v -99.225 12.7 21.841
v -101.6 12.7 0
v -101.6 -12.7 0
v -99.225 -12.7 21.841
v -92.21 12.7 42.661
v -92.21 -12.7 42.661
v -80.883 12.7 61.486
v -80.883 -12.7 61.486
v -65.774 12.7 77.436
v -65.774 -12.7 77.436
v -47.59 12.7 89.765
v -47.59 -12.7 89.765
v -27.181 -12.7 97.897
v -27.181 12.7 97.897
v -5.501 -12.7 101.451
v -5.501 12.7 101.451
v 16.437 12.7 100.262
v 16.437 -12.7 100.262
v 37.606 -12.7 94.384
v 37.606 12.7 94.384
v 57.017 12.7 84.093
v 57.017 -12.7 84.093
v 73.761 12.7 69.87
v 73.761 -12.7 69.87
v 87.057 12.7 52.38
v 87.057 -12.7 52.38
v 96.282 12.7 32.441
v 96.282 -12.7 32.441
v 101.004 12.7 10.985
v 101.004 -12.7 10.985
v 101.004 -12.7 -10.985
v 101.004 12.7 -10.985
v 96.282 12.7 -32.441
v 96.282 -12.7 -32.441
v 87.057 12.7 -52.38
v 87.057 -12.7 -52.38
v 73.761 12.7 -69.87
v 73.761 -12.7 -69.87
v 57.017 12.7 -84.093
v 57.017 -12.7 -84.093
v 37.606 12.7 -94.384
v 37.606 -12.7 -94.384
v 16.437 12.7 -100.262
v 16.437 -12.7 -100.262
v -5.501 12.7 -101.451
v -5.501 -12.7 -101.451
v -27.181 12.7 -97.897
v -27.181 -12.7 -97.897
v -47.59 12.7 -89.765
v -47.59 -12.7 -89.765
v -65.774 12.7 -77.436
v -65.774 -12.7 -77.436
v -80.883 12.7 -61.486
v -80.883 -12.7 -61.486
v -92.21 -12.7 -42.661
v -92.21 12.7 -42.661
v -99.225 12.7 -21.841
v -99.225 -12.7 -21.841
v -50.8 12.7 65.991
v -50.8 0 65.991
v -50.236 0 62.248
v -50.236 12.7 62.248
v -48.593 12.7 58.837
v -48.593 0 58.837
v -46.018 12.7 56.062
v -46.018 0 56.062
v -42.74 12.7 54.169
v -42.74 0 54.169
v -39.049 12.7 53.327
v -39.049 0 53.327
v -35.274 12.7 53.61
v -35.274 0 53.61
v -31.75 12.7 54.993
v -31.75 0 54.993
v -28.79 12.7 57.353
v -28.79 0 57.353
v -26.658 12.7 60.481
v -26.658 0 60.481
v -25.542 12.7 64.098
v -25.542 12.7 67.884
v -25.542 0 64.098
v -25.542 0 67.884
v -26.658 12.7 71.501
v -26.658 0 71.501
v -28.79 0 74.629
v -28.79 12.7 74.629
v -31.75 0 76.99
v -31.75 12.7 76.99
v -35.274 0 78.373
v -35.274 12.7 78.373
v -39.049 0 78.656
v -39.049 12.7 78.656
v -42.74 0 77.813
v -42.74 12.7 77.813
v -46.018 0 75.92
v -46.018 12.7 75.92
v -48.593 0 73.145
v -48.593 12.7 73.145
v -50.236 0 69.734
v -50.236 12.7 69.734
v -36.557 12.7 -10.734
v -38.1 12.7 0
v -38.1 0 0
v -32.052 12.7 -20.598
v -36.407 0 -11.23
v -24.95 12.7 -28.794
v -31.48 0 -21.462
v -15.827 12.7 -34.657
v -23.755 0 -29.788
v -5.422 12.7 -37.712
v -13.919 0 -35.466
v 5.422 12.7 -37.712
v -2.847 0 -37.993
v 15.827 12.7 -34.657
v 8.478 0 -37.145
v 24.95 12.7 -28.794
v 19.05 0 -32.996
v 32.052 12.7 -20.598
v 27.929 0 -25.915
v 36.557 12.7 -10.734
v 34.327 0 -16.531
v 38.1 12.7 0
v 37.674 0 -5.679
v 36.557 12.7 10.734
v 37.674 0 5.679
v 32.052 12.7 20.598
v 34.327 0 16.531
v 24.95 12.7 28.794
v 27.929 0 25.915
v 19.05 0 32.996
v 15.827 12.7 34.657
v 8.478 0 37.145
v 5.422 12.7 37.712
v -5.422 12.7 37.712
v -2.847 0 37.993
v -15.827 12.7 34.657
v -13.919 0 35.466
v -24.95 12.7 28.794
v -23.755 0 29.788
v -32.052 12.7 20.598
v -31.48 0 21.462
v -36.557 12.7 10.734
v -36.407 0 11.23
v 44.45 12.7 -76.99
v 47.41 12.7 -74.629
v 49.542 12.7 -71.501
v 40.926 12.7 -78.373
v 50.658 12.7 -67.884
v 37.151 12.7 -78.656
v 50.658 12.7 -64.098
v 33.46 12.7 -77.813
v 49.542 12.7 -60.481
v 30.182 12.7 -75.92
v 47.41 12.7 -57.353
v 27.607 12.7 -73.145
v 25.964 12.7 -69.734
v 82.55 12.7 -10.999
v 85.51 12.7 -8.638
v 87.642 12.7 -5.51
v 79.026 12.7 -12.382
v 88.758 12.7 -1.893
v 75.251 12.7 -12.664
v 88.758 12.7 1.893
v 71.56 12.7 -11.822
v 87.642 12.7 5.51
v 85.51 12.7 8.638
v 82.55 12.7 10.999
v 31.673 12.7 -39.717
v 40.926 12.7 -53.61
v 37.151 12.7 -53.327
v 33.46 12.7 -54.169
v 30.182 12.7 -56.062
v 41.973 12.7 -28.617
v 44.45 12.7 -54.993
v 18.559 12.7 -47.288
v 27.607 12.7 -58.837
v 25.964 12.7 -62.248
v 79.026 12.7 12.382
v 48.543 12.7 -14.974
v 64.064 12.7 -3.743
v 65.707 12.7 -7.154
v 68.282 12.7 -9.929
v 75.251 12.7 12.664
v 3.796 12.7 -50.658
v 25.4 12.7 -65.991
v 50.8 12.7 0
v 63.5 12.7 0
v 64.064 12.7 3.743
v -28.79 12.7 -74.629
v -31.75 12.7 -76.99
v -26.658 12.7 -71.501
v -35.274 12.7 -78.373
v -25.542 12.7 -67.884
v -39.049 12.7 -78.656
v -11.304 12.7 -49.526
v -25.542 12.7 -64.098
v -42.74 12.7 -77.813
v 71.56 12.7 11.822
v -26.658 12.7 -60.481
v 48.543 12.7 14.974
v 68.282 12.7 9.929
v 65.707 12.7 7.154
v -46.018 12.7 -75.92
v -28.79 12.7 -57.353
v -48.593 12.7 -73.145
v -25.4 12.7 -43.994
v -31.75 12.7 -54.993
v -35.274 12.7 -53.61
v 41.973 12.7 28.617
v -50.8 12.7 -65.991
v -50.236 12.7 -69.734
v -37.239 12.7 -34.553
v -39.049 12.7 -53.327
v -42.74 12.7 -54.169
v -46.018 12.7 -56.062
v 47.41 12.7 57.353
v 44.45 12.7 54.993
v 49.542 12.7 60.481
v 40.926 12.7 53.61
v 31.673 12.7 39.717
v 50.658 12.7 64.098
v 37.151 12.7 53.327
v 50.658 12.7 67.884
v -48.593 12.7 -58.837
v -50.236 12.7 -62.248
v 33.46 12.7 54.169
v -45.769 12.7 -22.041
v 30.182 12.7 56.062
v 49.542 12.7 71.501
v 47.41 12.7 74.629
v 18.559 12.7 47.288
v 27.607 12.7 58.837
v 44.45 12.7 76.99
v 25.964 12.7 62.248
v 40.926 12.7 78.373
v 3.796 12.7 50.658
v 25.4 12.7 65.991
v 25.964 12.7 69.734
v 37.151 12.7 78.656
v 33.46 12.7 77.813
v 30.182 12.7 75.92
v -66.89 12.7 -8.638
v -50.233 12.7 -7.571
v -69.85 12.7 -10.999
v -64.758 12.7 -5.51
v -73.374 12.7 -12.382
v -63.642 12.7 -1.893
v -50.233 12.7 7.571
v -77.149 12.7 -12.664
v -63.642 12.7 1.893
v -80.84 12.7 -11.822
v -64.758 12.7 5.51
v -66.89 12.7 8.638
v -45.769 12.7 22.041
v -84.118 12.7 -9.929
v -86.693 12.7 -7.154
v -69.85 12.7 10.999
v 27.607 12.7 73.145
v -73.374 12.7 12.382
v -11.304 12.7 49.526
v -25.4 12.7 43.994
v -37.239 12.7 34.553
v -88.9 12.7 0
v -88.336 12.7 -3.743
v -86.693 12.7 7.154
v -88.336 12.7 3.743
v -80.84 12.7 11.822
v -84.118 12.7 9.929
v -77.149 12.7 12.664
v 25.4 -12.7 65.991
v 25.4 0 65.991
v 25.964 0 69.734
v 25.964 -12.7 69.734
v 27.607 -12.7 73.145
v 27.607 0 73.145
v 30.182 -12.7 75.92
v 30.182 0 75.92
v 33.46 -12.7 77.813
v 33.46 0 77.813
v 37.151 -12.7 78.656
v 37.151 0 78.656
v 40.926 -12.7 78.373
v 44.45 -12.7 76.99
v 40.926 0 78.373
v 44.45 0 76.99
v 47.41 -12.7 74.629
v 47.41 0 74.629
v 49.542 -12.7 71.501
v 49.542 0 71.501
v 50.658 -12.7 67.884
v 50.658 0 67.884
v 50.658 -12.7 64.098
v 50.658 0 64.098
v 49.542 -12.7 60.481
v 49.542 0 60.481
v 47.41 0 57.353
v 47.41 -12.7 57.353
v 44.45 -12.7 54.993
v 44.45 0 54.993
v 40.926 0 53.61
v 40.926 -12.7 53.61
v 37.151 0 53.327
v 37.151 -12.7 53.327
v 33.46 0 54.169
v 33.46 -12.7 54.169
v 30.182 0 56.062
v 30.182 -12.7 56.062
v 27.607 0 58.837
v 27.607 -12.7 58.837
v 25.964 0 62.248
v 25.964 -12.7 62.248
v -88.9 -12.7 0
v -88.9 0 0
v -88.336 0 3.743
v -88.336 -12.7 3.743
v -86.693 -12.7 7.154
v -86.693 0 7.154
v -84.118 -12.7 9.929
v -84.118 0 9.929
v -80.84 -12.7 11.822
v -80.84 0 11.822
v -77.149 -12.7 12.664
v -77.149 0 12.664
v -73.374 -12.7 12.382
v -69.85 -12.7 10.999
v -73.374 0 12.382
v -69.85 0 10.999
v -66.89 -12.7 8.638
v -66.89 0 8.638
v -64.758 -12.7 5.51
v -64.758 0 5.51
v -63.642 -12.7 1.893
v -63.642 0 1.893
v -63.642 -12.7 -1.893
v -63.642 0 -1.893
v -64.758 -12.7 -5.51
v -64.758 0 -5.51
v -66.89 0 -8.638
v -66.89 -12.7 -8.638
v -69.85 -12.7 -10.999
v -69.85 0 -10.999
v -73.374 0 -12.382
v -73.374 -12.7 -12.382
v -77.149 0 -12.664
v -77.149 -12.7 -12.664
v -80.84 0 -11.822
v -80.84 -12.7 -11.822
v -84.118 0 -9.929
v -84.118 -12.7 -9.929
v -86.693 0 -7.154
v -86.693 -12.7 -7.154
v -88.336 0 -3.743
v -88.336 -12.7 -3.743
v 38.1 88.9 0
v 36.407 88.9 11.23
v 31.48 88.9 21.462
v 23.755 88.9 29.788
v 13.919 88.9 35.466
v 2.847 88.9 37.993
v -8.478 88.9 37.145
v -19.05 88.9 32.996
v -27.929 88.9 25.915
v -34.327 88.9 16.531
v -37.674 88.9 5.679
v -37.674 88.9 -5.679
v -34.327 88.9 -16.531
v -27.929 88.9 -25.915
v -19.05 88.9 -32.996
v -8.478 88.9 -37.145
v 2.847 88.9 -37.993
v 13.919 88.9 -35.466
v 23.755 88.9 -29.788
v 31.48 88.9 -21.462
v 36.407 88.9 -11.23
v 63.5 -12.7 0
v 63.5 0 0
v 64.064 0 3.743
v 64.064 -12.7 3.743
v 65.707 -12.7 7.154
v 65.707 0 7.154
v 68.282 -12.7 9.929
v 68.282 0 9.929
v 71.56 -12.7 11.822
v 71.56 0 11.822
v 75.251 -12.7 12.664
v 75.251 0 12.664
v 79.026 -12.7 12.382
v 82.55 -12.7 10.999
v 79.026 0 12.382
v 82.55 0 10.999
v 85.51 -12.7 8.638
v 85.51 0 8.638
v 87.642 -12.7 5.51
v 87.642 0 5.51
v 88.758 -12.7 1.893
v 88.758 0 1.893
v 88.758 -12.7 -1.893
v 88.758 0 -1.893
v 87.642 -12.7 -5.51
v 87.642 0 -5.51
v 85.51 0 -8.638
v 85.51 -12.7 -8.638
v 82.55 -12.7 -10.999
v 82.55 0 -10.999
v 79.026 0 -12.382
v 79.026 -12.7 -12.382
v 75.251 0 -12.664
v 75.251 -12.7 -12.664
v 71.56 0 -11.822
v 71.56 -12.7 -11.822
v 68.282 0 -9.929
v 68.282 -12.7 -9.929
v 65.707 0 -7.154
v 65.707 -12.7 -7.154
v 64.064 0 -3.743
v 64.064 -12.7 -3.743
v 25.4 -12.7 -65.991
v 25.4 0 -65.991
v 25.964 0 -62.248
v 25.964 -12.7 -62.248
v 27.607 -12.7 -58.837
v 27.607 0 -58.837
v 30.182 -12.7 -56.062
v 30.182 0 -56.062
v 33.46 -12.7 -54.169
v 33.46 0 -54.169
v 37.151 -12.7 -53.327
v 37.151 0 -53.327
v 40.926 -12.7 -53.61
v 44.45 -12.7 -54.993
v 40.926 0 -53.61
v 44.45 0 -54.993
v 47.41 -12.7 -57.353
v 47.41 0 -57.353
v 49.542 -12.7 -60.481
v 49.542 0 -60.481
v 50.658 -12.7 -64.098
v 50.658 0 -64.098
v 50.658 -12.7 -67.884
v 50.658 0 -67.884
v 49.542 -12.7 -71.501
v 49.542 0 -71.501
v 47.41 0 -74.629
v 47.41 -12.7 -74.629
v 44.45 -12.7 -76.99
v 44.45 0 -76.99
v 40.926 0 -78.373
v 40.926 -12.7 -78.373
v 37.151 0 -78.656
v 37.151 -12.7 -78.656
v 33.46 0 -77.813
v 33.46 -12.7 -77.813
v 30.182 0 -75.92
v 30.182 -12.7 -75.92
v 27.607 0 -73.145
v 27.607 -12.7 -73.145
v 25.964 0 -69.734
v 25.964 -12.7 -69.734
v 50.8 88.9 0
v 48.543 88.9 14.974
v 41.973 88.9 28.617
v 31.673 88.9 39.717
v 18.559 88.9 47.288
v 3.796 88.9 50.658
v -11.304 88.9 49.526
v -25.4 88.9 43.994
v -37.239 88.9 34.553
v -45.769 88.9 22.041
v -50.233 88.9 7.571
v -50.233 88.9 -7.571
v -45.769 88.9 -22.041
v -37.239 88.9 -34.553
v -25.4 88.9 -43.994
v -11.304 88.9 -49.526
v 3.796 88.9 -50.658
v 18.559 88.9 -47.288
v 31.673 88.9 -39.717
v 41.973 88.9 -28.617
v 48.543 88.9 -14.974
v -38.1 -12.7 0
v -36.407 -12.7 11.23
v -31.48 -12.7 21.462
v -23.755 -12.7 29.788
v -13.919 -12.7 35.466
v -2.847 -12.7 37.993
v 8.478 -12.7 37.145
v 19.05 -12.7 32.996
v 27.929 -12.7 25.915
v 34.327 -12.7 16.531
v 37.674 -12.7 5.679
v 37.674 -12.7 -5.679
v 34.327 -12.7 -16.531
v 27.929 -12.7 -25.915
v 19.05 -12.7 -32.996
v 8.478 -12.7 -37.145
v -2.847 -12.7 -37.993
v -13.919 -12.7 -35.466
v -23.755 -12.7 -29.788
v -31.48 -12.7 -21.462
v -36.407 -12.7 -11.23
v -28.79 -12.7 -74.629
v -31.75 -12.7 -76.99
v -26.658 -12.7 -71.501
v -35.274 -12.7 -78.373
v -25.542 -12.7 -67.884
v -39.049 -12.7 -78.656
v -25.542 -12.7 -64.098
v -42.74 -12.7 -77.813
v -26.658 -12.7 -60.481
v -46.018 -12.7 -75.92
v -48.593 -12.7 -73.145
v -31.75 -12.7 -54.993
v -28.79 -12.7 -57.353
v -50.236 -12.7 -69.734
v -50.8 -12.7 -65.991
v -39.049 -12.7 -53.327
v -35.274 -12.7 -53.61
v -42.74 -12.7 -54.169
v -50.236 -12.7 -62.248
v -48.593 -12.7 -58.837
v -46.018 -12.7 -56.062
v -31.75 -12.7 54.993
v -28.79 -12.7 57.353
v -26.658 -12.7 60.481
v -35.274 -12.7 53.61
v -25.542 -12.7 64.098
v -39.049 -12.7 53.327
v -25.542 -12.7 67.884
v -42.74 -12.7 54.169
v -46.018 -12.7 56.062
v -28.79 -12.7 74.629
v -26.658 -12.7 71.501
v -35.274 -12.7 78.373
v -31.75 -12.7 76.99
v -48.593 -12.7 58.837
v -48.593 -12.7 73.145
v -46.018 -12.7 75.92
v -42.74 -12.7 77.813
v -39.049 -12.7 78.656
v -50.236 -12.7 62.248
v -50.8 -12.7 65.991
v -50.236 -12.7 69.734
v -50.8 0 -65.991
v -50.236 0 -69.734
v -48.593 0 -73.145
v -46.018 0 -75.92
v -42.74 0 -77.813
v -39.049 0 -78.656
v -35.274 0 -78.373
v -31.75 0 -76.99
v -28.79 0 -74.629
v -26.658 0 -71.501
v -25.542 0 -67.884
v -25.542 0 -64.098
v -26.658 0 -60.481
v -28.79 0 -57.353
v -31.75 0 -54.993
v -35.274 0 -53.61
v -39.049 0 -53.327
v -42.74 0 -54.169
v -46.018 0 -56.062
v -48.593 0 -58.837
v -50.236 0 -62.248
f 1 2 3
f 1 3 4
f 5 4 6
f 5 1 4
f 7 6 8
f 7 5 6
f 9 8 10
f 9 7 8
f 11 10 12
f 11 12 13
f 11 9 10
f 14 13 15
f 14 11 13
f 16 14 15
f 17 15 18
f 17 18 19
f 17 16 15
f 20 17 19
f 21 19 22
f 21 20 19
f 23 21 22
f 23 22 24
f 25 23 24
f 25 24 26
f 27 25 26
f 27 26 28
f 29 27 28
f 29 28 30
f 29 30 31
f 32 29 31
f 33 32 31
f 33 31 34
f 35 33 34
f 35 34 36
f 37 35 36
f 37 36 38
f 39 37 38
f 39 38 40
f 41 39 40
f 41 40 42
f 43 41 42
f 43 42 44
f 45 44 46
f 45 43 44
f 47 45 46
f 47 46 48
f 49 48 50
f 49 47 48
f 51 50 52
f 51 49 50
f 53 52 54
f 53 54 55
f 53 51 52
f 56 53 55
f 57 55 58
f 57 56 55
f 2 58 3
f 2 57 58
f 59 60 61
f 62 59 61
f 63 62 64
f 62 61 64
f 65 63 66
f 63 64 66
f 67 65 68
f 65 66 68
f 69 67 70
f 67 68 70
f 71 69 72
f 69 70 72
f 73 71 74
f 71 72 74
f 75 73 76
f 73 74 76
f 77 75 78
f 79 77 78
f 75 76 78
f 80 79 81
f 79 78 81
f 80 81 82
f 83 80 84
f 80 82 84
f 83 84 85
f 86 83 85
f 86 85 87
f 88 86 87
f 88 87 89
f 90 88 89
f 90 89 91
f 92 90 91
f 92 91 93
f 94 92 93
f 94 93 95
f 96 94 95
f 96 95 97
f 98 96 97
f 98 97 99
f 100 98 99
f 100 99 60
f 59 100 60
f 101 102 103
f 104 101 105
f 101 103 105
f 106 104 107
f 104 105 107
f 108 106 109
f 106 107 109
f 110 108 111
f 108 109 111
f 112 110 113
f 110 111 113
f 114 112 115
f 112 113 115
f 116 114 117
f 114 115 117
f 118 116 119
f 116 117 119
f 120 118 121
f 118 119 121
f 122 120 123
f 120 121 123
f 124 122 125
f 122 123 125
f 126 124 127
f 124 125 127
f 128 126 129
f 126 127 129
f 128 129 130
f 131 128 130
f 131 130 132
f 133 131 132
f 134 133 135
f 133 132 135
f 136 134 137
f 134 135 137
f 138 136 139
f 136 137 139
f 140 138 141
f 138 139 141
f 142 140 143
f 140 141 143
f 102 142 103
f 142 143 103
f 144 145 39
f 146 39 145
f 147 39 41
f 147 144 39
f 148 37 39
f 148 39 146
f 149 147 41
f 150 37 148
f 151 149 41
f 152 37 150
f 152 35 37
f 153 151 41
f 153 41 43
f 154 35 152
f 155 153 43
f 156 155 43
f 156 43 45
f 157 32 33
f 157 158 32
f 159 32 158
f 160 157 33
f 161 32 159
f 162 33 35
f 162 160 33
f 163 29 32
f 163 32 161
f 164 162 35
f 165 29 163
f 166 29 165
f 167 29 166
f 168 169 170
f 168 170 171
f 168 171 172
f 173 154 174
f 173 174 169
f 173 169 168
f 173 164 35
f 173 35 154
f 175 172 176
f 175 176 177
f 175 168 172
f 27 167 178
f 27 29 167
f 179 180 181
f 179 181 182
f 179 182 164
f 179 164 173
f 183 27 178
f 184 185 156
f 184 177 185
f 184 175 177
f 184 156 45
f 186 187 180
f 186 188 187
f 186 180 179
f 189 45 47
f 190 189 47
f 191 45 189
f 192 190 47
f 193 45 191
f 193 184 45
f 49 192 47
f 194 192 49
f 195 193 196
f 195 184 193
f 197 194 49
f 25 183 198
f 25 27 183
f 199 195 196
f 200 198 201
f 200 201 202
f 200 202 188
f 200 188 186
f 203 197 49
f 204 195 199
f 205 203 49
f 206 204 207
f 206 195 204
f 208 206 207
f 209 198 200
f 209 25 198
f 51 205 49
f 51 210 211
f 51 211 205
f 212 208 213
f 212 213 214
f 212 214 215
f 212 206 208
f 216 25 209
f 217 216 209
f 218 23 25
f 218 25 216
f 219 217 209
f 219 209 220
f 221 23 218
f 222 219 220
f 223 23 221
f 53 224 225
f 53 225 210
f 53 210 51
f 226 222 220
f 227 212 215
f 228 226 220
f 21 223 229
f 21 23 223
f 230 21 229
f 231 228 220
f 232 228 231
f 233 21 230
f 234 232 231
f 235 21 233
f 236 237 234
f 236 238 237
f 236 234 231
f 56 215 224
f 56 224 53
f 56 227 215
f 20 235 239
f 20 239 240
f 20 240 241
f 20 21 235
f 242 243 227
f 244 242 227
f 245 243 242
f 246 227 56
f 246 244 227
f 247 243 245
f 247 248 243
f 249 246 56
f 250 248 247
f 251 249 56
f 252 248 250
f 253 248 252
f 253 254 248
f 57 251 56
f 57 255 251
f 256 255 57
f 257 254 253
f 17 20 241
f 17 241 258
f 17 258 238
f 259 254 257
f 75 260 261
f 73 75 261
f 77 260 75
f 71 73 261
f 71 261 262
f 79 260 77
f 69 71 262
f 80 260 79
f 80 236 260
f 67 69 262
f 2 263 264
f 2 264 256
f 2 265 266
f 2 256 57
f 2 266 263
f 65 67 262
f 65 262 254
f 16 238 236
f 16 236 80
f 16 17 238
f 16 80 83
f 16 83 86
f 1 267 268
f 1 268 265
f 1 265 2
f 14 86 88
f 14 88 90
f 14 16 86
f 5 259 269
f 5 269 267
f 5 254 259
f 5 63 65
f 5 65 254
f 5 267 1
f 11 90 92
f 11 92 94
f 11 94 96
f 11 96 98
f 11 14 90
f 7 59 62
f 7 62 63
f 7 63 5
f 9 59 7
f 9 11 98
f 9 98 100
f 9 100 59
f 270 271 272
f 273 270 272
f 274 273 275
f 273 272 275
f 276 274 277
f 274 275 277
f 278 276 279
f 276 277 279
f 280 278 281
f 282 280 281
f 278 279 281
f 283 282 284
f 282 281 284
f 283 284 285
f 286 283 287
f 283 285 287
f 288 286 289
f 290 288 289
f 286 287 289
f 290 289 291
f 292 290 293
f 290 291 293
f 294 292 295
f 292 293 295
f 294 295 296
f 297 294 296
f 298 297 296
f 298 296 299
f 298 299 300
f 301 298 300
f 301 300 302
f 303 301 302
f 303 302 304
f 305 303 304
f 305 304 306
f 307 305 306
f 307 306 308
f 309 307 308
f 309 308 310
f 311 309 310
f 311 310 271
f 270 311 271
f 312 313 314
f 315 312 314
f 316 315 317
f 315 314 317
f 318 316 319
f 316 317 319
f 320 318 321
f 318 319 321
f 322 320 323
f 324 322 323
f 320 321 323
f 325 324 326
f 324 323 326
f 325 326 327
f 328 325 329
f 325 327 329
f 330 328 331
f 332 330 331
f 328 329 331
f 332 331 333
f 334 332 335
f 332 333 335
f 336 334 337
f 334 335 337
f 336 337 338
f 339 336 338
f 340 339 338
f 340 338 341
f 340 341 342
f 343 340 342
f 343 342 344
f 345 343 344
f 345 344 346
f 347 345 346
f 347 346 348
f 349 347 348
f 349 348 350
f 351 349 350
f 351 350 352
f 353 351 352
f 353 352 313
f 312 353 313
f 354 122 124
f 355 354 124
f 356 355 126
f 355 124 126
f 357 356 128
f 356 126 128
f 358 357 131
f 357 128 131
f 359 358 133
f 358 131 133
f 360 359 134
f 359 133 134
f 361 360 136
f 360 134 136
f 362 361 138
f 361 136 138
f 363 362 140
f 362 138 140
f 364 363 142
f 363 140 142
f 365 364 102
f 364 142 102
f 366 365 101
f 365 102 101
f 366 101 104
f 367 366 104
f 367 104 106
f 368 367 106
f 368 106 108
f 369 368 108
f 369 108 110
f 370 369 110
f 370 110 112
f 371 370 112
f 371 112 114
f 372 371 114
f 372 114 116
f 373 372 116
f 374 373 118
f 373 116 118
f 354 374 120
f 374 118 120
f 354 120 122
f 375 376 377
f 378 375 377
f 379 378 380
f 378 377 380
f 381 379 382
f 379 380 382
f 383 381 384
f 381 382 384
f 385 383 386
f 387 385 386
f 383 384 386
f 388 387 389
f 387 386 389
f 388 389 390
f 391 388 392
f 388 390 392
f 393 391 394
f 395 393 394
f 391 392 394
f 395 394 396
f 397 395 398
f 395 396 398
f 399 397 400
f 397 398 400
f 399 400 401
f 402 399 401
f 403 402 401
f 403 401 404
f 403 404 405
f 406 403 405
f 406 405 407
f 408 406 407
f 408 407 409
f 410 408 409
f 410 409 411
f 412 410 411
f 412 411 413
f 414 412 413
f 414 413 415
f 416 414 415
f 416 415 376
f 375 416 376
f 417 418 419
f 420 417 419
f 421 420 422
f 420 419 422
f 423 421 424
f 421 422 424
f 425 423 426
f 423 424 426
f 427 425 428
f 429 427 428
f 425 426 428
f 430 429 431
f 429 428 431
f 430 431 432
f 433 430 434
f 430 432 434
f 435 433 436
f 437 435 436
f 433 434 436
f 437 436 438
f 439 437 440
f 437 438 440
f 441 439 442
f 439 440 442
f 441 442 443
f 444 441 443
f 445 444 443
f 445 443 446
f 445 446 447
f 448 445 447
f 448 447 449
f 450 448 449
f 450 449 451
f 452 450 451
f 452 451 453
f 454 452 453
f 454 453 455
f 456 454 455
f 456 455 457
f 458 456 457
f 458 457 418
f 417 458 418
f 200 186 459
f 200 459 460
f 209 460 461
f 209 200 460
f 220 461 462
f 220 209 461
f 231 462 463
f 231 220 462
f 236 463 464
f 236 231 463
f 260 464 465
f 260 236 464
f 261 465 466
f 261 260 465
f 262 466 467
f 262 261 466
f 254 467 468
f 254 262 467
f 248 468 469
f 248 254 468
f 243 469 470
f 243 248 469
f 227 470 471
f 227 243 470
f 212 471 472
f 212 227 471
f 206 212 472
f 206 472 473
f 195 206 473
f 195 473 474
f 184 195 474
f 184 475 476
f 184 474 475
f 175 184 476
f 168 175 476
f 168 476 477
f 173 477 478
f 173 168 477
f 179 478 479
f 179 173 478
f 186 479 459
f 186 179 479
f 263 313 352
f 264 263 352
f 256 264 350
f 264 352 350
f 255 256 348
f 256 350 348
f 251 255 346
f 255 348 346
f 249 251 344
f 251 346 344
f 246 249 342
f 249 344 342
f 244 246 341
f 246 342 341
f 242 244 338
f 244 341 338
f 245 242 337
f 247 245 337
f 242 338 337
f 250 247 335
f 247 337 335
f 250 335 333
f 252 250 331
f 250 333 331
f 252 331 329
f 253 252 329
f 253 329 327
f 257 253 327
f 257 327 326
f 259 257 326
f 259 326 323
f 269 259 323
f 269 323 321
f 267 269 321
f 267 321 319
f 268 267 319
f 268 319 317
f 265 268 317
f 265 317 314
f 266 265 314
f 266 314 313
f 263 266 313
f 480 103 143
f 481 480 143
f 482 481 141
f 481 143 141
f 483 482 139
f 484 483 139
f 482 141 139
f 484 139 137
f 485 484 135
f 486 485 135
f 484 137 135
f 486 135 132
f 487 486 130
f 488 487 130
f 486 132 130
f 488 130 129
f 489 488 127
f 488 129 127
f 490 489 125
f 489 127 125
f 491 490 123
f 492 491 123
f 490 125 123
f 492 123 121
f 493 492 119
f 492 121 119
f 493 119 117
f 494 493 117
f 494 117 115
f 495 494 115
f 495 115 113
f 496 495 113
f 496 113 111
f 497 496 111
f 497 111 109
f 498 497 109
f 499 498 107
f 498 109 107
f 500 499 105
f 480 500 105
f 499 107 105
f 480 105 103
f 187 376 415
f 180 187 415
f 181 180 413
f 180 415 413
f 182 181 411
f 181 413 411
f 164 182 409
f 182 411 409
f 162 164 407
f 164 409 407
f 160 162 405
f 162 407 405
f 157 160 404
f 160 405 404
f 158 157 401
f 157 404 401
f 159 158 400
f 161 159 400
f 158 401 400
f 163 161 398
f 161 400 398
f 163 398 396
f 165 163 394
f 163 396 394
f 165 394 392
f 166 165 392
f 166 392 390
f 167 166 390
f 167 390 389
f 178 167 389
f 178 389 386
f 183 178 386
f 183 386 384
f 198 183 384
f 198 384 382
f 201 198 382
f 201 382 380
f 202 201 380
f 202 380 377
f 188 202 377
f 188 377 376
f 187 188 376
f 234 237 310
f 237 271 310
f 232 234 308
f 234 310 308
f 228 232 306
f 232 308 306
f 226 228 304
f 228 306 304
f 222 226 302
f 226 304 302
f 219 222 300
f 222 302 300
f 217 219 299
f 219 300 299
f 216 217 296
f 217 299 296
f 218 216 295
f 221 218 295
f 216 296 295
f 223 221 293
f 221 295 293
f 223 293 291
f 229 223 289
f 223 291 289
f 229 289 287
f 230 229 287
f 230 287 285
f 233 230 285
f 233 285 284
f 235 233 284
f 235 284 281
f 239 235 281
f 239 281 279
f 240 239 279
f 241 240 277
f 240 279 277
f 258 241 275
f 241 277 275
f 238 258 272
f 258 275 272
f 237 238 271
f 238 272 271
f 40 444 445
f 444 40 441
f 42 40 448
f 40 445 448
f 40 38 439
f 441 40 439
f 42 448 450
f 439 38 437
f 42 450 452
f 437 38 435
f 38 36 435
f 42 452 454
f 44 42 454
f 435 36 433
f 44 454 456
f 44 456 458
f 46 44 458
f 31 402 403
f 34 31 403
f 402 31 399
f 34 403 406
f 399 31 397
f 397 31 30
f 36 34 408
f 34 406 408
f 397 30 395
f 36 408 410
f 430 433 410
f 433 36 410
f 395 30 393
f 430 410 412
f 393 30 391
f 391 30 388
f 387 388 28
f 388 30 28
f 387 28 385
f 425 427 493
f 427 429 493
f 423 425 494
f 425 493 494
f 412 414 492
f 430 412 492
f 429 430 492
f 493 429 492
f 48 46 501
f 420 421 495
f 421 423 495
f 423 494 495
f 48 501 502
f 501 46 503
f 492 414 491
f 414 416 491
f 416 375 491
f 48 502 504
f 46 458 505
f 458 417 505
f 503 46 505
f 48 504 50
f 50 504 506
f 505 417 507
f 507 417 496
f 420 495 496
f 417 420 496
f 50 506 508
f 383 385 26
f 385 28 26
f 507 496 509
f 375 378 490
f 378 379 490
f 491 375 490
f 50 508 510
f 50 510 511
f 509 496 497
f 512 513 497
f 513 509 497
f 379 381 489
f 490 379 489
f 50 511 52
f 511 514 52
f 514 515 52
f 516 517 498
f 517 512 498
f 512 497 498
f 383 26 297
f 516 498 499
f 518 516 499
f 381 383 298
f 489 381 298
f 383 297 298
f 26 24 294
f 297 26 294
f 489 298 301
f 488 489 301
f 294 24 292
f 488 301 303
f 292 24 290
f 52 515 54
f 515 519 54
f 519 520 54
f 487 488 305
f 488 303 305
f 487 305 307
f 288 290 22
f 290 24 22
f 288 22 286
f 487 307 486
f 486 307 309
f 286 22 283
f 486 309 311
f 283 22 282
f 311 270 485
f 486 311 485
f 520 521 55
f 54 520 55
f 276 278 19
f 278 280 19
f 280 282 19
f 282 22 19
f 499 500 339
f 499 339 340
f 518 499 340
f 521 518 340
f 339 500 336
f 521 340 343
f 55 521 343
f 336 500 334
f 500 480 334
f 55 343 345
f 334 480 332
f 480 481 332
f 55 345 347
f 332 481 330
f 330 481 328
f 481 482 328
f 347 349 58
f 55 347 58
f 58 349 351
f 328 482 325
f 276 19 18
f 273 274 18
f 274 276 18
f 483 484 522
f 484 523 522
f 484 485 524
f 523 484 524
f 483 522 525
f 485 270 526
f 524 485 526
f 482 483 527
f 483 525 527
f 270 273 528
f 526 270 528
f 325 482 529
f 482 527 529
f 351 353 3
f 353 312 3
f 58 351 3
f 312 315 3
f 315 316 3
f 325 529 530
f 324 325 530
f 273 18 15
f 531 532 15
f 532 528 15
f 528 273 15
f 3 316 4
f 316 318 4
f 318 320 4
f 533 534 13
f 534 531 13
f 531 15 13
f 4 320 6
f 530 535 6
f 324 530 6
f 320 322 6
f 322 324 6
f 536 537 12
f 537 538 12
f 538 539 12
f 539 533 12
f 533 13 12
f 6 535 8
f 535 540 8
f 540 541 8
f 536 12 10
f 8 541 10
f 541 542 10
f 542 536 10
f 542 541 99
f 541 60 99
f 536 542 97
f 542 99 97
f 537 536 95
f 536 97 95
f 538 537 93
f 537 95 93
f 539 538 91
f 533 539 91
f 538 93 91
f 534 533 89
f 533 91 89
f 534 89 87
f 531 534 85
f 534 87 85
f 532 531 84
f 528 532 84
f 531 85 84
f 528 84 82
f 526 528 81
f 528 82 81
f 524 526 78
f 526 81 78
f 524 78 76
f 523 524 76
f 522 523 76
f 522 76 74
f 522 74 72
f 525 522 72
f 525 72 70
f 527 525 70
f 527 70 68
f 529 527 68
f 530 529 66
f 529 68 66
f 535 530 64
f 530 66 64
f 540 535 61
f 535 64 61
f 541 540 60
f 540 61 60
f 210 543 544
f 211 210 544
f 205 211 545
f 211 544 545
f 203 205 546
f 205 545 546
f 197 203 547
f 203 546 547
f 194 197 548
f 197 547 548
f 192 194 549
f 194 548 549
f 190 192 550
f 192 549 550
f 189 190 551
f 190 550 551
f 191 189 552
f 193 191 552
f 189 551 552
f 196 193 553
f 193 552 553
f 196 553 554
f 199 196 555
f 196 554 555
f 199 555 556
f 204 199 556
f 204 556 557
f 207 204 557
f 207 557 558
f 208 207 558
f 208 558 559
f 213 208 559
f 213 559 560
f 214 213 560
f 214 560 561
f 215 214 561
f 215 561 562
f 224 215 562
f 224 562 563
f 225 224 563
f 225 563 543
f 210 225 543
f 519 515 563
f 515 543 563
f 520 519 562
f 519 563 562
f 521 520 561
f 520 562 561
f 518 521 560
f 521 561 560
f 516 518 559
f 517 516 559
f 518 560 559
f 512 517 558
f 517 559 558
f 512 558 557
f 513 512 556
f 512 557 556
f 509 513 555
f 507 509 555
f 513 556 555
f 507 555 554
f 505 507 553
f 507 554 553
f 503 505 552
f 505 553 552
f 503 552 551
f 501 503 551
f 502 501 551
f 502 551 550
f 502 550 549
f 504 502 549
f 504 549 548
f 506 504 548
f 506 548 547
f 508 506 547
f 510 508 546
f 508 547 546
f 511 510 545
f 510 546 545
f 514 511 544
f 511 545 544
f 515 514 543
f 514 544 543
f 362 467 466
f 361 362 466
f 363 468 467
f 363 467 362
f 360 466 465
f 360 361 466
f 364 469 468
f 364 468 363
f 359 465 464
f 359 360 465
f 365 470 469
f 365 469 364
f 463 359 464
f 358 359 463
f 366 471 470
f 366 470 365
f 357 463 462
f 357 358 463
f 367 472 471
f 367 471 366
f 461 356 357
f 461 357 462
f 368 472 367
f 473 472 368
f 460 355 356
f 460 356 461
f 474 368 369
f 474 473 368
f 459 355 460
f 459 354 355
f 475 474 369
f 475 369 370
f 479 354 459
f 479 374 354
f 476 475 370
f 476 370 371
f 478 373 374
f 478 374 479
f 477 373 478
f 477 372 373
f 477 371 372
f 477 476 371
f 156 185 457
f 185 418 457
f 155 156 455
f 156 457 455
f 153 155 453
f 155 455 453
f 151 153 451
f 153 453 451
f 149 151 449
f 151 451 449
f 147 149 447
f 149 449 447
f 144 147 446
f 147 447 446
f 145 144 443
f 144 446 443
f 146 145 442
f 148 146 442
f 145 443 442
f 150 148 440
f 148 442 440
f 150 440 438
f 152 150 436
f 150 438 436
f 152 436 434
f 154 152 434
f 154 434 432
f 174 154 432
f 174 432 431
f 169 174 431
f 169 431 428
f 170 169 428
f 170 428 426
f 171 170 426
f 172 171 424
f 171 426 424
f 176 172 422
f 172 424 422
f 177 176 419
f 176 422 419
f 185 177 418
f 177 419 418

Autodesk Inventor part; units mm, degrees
ref_plane "YZ Plane" through (0, 0, 0) normal (1, 0, 0) x (0, 1, 0)
ref_plane "XZ Plane" through (0, 0, 0) normal (0, 1, 0) x (-1, 0, 0)
ref_plane "XY Plane" through (0, 0, 0) normal (0, 0, 1) x (1, 0, 0)
sketch "Sketch1" plane through (0, 0, 0) normal (0, 1, 0) x (-1, 0, 0)
  circle A0 centre (0, 0) radius 101.6
  circle A1 centre (0, 0) radius 76.2
  circle A2 centre (76.2, 0) radius 12.7
  circle A3 centre (38.1, 65.9911) radius 12.7
  circle A4 centre (-38.1, 65.9911) radius 12.7
  circle A5 centre (-76.2, 0) radius 12.7
  circle A6 centre (-38.1, -65.9911) radius 12.7
  circle A7 centre (38.1, -65.9911) radius 12.7
  circle A8 centre (0, 0) radius 38.1
  dimension "d1" = 152.4
  dimension "d0" = 203.2
  dimension "d2" = 25.4
  dimension "d5" = 360
  dimension "d7" = 76.2
extrude "Extrusion1" add sketch "Sketch1" along normal mid plane 25.4 contours A0 | A2 A1 A7 A6 A5 A4 A3
sketch "Sketch2" plane through (0, 12.7, 0) normal (0, 1, 0) x (1, 0, 0)
  circle A0 centre (0, 0) radius 38.1 projected
  circle A1 centre (0, 0) radius 50.8
  dimension "d10" = 101.6
extrude "Extrusion2" add sketch "Sketch2" along normal blind 76.2
properties part number "Leo-Berman-Section-Part-3"
